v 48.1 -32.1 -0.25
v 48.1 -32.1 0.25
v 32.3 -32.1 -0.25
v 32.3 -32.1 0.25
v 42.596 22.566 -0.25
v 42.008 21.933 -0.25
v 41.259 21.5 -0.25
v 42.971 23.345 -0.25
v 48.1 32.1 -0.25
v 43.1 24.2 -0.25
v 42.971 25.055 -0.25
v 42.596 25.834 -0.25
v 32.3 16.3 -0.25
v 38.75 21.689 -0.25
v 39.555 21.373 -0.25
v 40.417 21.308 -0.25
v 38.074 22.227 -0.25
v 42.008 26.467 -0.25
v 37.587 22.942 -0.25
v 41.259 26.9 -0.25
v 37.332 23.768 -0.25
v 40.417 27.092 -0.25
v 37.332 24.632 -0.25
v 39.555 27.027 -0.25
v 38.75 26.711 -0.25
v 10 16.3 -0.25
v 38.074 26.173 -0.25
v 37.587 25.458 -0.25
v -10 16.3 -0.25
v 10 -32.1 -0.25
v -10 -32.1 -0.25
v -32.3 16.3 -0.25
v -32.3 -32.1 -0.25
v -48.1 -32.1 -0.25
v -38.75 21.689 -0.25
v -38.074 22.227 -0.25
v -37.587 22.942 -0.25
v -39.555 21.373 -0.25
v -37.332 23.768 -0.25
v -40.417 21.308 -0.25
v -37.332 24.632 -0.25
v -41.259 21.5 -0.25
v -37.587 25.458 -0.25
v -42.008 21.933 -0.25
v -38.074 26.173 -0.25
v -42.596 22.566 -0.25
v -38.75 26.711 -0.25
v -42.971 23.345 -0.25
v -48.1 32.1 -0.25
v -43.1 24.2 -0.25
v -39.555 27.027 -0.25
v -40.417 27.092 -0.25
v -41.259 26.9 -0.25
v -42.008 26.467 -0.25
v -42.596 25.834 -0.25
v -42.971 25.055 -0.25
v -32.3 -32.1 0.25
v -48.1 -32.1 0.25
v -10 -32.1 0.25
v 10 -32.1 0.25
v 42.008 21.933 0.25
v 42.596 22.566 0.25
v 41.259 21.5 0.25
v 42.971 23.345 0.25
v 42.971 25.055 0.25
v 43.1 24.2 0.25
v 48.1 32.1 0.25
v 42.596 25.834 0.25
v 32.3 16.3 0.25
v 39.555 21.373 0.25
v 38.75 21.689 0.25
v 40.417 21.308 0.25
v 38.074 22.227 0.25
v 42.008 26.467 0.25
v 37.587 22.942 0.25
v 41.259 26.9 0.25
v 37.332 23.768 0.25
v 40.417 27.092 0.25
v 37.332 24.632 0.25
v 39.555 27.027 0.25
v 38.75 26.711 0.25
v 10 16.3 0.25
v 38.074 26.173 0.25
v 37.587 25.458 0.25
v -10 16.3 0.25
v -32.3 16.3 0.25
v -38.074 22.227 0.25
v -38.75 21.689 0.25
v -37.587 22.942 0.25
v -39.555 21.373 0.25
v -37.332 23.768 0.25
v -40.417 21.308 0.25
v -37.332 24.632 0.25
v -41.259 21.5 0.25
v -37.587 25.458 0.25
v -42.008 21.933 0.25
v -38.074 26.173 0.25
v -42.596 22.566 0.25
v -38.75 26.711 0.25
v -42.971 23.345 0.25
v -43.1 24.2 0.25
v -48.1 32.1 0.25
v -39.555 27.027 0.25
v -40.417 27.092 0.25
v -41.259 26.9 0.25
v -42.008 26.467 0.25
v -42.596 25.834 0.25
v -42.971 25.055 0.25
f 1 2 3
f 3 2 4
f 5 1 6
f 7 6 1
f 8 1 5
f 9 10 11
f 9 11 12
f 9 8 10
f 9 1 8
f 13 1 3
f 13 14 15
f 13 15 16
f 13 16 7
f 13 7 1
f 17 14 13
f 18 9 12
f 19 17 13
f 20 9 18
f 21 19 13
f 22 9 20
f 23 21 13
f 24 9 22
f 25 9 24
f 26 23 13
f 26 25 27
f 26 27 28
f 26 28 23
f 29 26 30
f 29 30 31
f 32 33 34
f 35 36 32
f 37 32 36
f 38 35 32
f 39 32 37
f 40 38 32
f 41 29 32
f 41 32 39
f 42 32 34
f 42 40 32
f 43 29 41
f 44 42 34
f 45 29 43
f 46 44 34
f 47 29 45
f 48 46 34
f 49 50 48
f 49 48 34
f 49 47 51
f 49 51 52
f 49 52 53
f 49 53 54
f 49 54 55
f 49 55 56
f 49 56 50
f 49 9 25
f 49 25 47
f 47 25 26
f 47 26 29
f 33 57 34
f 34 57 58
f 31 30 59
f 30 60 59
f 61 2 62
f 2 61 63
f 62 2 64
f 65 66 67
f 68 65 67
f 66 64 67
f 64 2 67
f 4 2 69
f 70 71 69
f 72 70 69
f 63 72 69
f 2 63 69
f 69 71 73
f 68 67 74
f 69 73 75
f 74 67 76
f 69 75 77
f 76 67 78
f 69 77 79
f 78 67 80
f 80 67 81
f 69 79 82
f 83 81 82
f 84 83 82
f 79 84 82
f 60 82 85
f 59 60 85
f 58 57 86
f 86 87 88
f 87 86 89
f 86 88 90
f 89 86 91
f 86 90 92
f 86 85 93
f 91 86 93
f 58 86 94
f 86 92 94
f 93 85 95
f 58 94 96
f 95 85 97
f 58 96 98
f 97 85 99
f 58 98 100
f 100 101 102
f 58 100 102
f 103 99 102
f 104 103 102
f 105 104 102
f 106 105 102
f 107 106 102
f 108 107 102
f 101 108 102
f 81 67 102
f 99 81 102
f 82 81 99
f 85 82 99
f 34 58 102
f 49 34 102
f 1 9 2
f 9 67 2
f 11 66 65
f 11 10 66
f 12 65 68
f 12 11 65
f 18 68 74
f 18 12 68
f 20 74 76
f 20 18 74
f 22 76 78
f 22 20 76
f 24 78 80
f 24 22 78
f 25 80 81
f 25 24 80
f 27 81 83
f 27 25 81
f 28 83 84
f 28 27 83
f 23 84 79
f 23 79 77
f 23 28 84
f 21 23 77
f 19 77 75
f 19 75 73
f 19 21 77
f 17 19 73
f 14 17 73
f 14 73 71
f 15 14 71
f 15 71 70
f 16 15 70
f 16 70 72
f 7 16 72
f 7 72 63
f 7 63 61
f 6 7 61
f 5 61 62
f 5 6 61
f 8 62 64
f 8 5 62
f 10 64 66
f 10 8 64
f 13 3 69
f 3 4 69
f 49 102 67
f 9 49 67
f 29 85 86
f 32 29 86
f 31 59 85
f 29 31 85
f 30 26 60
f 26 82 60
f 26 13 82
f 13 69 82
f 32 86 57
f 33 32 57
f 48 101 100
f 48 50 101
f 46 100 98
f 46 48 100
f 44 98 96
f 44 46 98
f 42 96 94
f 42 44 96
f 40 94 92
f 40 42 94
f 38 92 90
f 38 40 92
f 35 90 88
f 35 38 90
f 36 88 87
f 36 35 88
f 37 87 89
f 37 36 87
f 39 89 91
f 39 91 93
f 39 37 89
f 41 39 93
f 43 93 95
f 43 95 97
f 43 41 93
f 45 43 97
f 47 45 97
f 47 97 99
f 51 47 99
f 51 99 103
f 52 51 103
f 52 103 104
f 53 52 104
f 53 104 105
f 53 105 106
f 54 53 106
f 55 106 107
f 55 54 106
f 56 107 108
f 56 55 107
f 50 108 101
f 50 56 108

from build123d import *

# Parameters (mm, degrees)
SKETCH1_R           = 2.9
BOSS_EXTRUDE1_DEPTH = 0.25


with BuildPart() as part:
    # Sketch1 → Boss-Extrude1 (new, symmetric)
    with BuildSketch(Plane.XY):
        Polygon((-48.1, 32.1), (48.1, 32.1), (48.1, -32.1), (32.3, -32.1), (32.3, 16.3), (10, 16.3), (10, -32.1), (-10, -32.1), (-10, 16.3), (-32.3, 16.3), (-32.3, -32.1), (-48.1, -32.1), align=None)
        with Locations((40.2, 24.2)):
            Circle(SKETCH1_R, mode=Mode.SUBTRACT)
        with Locations(Location((-40.2, 24.2, 0), (0, 0, 180))):
            Circle(SKETCH1_R, mode=Mode.SUBTRACT)
    extrude(amount=BOSS_EXTRUDE1_DEPTH, both=True)


solid = part.part
